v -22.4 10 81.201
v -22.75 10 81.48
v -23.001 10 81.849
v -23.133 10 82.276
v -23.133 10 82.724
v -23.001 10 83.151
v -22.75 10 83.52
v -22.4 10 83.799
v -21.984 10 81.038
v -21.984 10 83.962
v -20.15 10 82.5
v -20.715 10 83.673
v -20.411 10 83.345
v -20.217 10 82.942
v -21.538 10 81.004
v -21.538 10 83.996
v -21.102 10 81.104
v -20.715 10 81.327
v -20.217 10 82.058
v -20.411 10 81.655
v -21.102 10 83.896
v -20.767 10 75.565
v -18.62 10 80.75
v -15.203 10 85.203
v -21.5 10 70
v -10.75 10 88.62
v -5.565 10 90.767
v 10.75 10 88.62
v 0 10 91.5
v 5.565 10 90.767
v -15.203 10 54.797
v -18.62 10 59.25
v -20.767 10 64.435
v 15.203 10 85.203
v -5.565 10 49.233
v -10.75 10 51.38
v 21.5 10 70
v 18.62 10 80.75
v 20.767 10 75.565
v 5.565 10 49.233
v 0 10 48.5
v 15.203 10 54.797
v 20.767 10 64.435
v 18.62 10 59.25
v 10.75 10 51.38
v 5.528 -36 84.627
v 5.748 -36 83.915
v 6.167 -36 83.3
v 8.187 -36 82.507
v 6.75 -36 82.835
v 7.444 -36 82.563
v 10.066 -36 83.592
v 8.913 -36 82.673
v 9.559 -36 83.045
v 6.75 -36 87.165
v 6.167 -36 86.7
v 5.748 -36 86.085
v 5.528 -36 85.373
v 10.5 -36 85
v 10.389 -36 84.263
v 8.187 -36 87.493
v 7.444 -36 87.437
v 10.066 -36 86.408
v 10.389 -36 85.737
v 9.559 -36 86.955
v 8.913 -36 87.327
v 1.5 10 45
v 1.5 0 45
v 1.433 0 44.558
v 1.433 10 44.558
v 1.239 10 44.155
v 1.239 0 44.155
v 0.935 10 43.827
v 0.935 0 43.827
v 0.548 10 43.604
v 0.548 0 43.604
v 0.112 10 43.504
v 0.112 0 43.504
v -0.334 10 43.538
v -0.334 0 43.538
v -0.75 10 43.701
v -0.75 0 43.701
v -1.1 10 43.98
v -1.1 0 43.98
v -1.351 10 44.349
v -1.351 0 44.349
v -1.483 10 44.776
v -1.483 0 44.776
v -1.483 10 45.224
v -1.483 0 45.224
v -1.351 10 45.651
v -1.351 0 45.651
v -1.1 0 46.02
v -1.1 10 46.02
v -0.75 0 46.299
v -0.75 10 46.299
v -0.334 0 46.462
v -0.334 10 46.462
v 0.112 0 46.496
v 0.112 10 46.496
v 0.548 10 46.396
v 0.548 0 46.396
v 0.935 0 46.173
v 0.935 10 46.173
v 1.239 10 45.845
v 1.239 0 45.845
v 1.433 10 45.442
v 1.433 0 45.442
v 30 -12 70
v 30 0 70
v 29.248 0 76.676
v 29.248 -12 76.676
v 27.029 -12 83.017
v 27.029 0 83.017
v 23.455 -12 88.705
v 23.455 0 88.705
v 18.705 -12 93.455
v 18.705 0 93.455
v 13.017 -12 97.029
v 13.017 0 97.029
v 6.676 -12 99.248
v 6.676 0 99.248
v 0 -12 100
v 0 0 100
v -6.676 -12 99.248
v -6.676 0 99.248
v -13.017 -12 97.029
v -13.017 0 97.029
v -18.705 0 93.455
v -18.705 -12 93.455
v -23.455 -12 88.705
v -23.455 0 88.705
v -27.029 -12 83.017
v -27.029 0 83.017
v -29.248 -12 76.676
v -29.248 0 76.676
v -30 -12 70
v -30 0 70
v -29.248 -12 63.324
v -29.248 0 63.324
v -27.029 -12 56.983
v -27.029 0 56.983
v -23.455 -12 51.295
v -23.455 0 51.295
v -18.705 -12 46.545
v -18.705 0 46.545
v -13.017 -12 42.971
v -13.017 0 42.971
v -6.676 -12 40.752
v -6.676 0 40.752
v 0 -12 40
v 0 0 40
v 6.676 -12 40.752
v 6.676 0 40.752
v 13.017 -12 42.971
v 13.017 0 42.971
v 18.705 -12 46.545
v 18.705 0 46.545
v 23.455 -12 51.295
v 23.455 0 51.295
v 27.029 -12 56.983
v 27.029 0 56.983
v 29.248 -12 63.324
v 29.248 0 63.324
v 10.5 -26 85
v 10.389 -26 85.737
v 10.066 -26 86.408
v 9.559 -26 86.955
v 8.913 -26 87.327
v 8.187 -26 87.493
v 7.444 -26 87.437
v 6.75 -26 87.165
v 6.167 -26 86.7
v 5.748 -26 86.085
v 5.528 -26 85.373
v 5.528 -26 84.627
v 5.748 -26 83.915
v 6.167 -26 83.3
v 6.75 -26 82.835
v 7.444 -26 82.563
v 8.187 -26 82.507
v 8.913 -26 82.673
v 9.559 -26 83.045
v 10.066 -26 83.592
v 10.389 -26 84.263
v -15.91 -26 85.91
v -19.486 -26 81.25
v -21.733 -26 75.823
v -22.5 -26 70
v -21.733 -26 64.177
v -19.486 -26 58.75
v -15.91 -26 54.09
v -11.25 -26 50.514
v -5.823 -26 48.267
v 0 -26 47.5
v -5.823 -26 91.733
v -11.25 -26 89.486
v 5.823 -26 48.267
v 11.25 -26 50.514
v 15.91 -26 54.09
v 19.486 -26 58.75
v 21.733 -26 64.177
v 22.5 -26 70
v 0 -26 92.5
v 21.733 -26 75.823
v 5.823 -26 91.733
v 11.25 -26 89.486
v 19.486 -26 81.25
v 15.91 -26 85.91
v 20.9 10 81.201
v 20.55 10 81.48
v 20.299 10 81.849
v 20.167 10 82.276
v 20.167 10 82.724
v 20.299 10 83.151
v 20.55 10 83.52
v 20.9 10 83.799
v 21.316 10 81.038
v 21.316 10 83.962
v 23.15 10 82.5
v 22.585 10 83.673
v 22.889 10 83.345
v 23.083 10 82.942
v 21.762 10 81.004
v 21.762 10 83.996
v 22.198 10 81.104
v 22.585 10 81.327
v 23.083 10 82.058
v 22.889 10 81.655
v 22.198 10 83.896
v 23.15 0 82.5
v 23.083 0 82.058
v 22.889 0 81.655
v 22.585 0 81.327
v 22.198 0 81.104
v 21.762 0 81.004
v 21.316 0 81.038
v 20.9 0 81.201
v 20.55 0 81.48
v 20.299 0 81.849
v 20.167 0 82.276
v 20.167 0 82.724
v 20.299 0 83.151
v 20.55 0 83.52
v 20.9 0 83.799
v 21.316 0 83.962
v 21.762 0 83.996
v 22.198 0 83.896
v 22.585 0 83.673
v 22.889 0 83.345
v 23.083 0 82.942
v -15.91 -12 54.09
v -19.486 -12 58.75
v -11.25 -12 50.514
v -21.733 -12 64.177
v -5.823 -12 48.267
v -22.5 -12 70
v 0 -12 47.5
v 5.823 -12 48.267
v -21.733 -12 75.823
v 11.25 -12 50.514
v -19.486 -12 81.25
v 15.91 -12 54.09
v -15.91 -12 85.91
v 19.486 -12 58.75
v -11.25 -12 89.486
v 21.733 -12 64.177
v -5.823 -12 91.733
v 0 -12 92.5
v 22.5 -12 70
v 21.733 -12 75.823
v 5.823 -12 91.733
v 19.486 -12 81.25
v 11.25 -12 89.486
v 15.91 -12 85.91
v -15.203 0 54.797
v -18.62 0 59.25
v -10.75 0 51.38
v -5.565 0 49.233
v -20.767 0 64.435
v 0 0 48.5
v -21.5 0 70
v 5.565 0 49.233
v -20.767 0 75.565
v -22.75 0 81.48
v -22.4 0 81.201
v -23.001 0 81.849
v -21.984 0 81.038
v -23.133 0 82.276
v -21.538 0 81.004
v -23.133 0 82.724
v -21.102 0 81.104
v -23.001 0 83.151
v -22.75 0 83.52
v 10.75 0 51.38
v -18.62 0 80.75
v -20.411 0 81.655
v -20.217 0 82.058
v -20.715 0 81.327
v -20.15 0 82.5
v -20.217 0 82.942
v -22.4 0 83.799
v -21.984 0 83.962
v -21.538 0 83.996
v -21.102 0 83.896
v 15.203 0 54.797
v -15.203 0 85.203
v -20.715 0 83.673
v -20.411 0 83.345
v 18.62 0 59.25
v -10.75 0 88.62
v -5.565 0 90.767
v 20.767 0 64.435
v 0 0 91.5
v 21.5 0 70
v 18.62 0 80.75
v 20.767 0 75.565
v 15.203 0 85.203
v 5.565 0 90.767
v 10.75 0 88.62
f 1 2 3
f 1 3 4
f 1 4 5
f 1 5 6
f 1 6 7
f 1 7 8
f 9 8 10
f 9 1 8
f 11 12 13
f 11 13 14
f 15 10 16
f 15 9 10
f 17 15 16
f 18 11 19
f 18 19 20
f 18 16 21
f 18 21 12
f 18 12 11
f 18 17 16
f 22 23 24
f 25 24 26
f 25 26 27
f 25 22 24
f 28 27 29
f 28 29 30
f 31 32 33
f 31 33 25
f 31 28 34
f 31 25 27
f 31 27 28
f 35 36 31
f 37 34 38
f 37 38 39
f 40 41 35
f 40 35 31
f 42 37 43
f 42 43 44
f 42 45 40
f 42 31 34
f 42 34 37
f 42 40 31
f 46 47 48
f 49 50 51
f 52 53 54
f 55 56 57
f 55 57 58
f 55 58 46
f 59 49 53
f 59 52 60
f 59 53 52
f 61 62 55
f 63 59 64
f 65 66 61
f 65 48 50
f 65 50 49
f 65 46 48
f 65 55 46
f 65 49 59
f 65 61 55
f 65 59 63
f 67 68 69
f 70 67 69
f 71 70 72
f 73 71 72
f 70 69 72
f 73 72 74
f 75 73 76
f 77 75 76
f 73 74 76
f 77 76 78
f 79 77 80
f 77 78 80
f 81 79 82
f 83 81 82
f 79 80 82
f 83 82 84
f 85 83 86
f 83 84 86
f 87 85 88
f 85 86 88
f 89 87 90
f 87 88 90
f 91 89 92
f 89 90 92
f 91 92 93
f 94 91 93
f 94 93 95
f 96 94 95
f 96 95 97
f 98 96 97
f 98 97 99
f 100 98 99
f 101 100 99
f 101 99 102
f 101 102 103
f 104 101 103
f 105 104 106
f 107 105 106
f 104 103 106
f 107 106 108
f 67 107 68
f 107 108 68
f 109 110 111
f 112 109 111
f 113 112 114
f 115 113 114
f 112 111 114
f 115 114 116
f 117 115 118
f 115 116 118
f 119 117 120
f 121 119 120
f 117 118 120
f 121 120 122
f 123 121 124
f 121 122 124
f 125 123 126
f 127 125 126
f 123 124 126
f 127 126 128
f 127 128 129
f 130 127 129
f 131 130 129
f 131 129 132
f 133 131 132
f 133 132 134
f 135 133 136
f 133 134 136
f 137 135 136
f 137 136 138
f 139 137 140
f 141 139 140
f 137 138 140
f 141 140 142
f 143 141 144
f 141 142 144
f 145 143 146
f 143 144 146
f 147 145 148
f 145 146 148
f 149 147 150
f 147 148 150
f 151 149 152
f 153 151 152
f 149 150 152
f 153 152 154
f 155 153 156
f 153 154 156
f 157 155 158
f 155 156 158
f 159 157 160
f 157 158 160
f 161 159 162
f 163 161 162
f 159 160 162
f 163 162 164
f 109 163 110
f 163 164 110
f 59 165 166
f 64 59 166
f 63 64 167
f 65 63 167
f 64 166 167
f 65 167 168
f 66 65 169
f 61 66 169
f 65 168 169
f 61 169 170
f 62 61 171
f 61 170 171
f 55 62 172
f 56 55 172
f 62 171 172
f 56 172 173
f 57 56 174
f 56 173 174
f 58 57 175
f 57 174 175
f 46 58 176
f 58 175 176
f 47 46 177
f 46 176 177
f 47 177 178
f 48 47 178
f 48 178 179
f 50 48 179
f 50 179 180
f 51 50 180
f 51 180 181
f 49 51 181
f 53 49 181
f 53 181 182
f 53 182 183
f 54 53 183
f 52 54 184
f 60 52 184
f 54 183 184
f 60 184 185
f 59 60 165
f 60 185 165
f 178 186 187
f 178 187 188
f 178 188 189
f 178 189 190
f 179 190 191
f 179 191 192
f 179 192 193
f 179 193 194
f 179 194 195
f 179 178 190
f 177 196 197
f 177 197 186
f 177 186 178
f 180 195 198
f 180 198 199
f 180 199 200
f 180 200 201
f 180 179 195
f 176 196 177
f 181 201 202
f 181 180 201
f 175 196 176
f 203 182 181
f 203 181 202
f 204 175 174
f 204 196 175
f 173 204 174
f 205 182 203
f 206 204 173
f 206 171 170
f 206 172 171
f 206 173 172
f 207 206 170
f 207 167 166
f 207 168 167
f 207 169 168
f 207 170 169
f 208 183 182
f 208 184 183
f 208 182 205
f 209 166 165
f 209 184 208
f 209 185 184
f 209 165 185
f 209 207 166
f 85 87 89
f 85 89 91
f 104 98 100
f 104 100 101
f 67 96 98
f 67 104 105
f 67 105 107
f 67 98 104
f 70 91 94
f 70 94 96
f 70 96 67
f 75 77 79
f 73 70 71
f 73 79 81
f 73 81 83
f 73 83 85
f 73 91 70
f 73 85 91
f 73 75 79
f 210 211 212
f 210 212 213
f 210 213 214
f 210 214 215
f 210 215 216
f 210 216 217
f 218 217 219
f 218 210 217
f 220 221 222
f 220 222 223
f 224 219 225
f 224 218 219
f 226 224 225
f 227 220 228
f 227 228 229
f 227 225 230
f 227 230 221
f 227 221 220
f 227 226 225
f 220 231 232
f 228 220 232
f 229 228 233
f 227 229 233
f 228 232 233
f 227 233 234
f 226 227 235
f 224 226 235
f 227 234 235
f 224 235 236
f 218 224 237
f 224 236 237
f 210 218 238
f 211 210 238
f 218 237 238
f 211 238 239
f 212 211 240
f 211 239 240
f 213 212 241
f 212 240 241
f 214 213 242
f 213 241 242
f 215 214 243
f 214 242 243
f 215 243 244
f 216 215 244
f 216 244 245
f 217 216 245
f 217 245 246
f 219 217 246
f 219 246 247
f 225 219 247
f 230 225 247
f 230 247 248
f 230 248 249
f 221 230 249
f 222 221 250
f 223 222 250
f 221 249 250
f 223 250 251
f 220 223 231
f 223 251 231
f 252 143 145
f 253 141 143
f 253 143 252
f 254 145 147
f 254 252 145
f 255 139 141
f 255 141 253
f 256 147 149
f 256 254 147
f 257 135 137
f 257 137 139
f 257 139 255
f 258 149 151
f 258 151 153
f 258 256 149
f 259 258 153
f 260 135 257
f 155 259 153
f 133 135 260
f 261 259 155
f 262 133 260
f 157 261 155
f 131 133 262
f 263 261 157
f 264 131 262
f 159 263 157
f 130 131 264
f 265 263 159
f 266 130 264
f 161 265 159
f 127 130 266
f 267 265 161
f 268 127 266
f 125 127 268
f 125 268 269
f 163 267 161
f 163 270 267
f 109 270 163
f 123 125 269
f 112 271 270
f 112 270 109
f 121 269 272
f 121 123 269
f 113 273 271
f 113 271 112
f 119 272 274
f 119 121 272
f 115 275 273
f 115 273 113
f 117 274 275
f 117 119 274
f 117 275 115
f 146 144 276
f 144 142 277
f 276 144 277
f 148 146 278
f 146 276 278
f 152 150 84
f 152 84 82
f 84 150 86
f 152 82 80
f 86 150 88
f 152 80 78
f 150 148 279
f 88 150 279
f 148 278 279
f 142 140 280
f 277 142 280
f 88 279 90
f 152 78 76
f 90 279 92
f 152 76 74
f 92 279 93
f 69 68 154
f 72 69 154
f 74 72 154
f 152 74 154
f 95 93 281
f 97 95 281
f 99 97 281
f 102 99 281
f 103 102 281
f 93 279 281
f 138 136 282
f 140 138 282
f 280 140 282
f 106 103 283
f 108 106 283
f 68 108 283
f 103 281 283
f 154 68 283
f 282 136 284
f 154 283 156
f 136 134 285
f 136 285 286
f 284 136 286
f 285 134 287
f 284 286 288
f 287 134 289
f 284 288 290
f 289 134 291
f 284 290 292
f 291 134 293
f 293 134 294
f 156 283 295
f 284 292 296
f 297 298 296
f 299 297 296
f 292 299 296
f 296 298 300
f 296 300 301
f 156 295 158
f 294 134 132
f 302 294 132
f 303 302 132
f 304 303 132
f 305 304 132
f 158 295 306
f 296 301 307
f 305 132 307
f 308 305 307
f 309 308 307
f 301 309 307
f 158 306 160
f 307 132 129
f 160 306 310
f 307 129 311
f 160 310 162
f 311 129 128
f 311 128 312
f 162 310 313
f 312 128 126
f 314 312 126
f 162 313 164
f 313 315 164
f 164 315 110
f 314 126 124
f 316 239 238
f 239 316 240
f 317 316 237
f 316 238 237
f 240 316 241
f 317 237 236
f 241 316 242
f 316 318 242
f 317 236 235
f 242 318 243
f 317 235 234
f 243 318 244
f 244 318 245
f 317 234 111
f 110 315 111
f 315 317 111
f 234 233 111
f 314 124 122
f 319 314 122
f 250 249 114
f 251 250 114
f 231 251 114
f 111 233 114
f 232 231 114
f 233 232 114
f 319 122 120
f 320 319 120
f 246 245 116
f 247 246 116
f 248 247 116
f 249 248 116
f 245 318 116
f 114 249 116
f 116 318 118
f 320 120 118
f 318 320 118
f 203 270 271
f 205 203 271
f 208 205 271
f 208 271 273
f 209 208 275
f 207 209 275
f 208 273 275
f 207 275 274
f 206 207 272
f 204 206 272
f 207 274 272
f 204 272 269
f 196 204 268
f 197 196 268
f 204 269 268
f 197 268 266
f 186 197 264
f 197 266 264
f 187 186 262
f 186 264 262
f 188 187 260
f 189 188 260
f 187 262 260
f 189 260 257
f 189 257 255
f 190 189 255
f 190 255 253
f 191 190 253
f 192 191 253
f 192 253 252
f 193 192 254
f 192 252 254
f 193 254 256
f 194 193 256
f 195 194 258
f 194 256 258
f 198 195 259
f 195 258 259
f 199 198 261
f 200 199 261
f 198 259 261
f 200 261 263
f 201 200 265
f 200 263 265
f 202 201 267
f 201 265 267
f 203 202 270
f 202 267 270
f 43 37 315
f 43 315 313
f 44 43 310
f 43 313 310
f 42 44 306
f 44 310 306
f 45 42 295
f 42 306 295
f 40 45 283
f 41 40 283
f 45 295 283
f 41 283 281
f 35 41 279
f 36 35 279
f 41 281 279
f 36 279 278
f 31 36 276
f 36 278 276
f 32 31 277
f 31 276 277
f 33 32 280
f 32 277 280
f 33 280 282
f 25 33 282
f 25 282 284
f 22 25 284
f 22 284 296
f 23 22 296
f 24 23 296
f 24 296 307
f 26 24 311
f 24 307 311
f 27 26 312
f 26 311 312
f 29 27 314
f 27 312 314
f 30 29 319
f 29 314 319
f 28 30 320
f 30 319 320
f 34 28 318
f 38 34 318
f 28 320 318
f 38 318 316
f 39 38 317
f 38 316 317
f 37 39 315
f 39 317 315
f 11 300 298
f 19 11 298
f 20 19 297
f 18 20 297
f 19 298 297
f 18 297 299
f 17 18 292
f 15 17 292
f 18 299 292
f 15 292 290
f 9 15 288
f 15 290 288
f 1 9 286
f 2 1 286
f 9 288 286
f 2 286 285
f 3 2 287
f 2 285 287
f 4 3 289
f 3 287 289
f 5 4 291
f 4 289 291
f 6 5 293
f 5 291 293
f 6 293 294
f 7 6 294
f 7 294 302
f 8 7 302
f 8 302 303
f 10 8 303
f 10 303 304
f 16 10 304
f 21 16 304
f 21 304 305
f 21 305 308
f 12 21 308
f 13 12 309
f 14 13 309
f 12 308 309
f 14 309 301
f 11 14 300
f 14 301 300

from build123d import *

# Parameters (mm, degrees)
SKETCH001_R             = 30
PAD001_DEPTH            = 12
SKETCH002_R             = 22.5
PAD002_DEPTH            = 14
SKETCH003_R             = 21.5
PAD003_DEPTH            = 10
SKETCH004_R             = 1.5
PAD004_DEPTH            = 10
SKETCH005_R             = 2.5
PAD005_DEPTH            = 10
BODY001_PLACEMENT_ANGLE = 90


with BuildPart() as part:
    # Sketch001 → Pad001 (new body)
    with BuildSketch(Plane.XY):
        Circle(SKETCH001_R)
    extrude(amount=PAD001_DEPTH)

    # Sketch002 (on Face3 of Pad001) → Pad002 (join)
    with BuildSketch(Plane.XY.offset(12)):
        Circle(SKETCH002_R)
    extrude(amount=PAD002_DEPTH)

    # Sketch003 (on Face2 of Pad002) → Pad003 (join)
    with BuildSketch(Plane(origin=(0, 0, 0), x_dir=(1, 0, 0), z_dir=(0, 0, -1))):
        Circle(SKETCH003_R)
    extrude(amount=PAD003_DEPTH)

    # Sketch004 (on Face2 of Pad003) → Pad004 (join)
    with BuildSketch(Plane(origin=(0, 0, 0), x_dir=(1, 0, 0), z_dir=(0, 0, -1))):
        with Locations((0, 25)):
            Circle(SKETCH004_R)
        with Locations((21.65, -12.5)):
            Circle(SKETCH004_R)
        with Locations((-21.65, -12.5)):
            Circle(SKETCH004_R)
    extrude(amount=PAD004_DEPTH)

    # Sketch005 (on Face13 of Pad004) → Pad005 (join)
    with BuildSketch(Plane.XY.offset(26)):
        with Locations((8, 15)):
            Circle(SKETCH005_R)
    extrude(amount=PAD005_DEPTH)


with BuildPart() as part_1:
    # Body001 placement: moved
    add(part.part.moved(Location((0, 0, 70))).rotate(Axis((0, 0, 70), (1, 0, 0)), BODY001_PLACEMENT_ANGLE))


solid = part_1.part
